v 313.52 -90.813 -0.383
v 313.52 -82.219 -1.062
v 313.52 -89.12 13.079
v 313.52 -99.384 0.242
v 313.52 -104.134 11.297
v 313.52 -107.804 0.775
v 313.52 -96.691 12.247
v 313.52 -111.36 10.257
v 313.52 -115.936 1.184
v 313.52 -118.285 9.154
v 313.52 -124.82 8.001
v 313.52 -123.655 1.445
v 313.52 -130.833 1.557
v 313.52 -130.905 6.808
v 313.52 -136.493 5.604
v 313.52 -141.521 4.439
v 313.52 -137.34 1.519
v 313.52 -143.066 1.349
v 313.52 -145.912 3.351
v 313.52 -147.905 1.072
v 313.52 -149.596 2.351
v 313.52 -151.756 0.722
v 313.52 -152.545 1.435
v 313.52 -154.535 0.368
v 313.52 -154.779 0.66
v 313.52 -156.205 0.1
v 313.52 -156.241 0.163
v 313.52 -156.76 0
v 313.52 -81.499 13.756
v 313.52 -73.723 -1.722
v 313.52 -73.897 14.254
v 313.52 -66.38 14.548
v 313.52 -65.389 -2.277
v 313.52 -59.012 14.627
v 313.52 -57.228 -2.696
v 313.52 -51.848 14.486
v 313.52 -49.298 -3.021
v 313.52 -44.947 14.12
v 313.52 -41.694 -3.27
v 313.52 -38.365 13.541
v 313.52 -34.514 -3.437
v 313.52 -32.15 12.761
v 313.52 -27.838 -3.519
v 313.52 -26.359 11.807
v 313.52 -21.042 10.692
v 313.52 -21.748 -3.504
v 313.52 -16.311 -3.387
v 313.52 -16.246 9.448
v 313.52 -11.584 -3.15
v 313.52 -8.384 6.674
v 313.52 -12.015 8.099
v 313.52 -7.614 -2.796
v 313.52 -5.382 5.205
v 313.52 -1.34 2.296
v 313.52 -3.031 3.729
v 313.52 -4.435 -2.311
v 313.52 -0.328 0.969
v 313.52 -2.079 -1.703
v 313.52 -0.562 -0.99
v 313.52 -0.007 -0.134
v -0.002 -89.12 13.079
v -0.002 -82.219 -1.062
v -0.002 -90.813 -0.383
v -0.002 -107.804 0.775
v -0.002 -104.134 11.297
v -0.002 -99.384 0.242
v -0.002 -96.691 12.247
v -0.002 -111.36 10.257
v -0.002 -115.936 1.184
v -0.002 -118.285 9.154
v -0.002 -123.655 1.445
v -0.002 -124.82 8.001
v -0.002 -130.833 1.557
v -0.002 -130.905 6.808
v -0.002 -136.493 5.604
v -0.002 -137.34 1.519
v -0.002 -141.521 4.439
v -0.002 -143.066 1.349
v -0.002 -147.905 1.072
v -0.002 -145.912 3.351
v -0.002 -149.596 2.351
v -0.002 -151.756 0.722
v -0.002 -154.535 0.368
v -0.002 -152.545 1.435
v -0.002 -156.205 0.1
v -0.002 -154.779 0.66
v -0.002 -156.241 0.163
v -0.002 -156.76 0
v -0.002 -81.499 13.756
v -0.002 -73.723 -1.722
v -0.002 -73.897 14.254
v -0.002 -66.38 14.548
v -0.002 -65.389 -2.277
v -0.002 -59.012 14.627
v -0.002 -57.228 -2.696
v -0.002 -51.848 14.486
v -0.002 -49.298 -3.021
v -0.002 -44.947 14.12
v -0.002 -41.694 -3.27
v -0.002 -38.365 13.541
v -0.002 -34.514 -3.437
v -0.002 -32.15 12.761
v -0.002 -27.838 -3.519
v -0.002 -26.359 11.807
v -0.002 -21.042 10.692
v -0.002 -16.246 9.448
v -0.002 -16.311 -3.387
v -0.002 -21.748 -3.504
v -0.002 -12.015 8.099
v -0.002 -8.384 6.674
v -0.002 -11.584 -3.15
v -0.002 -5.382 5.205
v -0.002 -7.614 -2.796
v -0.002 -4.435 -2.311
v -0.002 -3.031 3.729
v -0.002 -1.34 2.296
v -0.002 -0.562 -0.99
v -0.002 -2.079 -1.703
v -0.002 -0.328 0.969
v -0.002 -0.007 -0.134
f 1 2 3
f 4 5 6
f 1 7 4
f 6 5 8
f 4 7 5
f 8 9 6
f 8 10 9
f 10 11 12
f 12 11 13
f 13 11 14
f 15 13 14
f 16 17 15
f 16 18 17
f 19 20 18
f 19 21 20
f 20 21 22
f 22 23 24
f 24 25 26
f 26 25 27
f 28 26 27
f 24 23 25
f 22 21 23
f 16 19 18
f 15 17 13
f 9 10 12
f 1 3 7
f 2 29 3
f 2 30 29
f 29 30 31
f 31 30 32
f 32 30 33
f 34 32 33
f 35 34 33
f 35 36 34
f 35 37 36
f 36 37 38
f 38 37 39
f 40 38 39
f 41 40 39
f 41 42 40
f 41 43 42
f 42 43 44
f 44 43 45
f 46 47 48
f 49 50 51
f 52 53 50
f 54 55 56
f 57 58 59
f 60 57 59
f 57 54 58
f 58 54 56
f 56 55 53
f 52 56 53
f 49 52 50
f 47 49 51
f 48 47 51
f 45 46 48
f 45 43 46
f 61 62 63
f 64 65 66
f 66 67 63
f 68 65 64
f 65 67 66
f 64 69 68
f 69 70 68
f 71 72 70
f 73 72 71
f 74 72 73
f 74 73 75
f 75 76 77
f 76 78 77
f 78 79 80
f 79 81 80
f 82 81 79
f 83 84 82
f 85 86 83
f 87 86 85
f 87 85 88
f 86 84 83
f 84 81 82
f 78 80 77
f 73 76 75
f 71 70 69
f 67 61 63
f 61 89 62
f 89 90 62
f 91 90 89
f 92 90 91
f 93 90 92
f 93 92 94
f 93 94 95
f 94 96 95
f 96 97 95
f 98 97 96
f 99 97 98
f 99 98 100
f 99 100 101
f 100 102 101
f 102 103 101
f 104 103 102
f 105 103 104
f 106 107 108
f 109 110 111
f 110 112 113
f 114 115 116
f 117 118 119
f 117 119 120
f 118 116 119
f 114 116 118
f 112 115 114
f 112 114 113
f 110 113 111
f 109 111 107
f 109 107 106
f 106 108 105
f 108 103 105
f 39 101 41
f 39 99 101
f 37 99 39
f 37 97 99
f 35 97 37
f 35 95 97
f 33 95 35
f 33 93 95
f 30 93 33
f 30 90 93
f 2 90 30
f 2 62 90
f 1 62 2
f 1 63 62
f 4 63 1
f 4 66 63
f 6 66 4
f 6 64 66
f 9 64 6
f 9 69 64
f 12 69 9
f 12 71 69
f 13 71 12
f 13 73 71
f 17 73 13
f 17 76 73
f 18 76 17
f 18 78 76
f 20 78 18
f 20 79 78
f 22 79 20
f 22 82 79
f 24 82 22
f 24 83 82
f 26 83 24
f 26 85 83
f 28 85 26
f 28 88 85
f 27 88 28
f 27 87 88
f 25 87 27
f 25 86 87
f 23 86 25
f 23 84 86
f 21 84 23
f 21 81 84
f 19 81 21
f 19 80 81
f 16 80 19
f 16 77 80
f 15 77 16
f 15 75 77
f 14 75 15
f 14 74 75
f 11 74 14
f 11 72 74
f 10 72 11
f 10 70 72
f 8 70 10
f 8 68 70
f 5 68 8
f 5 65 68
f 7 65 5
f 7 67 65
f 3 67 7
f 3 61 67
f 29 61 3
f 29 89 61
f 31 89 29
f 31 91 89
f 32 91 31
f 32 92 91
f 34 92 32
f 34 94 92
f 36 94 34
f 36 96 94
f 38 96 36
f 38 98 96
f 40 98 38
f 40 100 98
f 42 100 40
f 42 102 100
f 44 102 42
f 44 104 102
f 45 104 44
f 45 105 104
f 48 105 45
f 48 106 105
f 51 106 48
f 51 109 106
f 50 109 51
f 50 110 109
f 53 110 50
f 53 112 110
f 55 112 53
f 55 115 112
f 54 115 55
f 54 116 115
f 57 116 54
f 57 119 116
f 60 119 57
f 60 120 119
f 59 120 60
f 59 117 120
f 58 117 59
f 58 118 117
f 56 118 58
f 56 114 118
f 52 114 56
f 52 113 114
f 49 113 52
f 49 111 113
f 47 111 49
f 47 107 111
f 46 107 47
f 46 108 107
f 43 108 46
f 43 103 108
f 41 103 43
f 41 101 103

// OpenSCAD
rotate([90, 0, -90]) translate([0.00,0.00,-313.52]) linear_extrude(height=313.52224676) scale([156.76,156.76,1.00]) polygon(points=[[1.0, 0.0], [0.99669, 0.00104], [0.98737, 0.00422], [0.97312, 0.00916], [0.95431, 0.01501], [0.93081, 0.02139], [0.90279, 0.02833], [0.87072, 0.03576], [0.83508, 0.04344], [0.79626, 0.05105], [0.75457, 0.05841], [0.7104, 0.06544], [0.6643, 0.07207], [0.61682, 0.07813], [0.56852, 0.08344], [0.51991, 0.08776], [0.47142, 0.09093], [0.42346, 0.09281], [0.37645, 0.09332], [0.33076, 0.09241], [0.28674, 0.09008], [0.24474, 0.08639], [0.2051, 0.08142], [0.16816, 0.07532], [0.13424, 0.06822], [0.10365, 0.06028], [0.07665, 0.05168], [0.05349, 0.04258], [0.03434, 0.03321], [0.01934, 0.02379], [0.00856, 0.01465], [0.0021, 0.00619], [5e-05, -0.00086], [0.0036, -0.00632], [0.01326, -0.01087], [0.0283, -0.01475], [0.04858, -0.01784], [0.0739, -0.02011], [0.10406, -0.02161], [0.13874, -0.02236], [0.17759, -0.02245], [0.22017, -0.02193], [0.26599, -0.02086], [0.31449, -0.01928], [0.36508, -0.01721], [0.41714, -0.01453], [0.4703, -0.011], [0.5245, -0.00678], [0.57932, -0.00245], [0.634, 0.00155], [0.6877, 0.00495], [0.73959, 0.00756], [0.78883, 0.00923], [0.83461, 0.00994], [0.87612, 0.0097], [0.91265, 0.00862], [0.94352, 0.00684], [0.96809, 0.00461], [0.98582, 0.00235], [0.99646, 0.00065]]);
